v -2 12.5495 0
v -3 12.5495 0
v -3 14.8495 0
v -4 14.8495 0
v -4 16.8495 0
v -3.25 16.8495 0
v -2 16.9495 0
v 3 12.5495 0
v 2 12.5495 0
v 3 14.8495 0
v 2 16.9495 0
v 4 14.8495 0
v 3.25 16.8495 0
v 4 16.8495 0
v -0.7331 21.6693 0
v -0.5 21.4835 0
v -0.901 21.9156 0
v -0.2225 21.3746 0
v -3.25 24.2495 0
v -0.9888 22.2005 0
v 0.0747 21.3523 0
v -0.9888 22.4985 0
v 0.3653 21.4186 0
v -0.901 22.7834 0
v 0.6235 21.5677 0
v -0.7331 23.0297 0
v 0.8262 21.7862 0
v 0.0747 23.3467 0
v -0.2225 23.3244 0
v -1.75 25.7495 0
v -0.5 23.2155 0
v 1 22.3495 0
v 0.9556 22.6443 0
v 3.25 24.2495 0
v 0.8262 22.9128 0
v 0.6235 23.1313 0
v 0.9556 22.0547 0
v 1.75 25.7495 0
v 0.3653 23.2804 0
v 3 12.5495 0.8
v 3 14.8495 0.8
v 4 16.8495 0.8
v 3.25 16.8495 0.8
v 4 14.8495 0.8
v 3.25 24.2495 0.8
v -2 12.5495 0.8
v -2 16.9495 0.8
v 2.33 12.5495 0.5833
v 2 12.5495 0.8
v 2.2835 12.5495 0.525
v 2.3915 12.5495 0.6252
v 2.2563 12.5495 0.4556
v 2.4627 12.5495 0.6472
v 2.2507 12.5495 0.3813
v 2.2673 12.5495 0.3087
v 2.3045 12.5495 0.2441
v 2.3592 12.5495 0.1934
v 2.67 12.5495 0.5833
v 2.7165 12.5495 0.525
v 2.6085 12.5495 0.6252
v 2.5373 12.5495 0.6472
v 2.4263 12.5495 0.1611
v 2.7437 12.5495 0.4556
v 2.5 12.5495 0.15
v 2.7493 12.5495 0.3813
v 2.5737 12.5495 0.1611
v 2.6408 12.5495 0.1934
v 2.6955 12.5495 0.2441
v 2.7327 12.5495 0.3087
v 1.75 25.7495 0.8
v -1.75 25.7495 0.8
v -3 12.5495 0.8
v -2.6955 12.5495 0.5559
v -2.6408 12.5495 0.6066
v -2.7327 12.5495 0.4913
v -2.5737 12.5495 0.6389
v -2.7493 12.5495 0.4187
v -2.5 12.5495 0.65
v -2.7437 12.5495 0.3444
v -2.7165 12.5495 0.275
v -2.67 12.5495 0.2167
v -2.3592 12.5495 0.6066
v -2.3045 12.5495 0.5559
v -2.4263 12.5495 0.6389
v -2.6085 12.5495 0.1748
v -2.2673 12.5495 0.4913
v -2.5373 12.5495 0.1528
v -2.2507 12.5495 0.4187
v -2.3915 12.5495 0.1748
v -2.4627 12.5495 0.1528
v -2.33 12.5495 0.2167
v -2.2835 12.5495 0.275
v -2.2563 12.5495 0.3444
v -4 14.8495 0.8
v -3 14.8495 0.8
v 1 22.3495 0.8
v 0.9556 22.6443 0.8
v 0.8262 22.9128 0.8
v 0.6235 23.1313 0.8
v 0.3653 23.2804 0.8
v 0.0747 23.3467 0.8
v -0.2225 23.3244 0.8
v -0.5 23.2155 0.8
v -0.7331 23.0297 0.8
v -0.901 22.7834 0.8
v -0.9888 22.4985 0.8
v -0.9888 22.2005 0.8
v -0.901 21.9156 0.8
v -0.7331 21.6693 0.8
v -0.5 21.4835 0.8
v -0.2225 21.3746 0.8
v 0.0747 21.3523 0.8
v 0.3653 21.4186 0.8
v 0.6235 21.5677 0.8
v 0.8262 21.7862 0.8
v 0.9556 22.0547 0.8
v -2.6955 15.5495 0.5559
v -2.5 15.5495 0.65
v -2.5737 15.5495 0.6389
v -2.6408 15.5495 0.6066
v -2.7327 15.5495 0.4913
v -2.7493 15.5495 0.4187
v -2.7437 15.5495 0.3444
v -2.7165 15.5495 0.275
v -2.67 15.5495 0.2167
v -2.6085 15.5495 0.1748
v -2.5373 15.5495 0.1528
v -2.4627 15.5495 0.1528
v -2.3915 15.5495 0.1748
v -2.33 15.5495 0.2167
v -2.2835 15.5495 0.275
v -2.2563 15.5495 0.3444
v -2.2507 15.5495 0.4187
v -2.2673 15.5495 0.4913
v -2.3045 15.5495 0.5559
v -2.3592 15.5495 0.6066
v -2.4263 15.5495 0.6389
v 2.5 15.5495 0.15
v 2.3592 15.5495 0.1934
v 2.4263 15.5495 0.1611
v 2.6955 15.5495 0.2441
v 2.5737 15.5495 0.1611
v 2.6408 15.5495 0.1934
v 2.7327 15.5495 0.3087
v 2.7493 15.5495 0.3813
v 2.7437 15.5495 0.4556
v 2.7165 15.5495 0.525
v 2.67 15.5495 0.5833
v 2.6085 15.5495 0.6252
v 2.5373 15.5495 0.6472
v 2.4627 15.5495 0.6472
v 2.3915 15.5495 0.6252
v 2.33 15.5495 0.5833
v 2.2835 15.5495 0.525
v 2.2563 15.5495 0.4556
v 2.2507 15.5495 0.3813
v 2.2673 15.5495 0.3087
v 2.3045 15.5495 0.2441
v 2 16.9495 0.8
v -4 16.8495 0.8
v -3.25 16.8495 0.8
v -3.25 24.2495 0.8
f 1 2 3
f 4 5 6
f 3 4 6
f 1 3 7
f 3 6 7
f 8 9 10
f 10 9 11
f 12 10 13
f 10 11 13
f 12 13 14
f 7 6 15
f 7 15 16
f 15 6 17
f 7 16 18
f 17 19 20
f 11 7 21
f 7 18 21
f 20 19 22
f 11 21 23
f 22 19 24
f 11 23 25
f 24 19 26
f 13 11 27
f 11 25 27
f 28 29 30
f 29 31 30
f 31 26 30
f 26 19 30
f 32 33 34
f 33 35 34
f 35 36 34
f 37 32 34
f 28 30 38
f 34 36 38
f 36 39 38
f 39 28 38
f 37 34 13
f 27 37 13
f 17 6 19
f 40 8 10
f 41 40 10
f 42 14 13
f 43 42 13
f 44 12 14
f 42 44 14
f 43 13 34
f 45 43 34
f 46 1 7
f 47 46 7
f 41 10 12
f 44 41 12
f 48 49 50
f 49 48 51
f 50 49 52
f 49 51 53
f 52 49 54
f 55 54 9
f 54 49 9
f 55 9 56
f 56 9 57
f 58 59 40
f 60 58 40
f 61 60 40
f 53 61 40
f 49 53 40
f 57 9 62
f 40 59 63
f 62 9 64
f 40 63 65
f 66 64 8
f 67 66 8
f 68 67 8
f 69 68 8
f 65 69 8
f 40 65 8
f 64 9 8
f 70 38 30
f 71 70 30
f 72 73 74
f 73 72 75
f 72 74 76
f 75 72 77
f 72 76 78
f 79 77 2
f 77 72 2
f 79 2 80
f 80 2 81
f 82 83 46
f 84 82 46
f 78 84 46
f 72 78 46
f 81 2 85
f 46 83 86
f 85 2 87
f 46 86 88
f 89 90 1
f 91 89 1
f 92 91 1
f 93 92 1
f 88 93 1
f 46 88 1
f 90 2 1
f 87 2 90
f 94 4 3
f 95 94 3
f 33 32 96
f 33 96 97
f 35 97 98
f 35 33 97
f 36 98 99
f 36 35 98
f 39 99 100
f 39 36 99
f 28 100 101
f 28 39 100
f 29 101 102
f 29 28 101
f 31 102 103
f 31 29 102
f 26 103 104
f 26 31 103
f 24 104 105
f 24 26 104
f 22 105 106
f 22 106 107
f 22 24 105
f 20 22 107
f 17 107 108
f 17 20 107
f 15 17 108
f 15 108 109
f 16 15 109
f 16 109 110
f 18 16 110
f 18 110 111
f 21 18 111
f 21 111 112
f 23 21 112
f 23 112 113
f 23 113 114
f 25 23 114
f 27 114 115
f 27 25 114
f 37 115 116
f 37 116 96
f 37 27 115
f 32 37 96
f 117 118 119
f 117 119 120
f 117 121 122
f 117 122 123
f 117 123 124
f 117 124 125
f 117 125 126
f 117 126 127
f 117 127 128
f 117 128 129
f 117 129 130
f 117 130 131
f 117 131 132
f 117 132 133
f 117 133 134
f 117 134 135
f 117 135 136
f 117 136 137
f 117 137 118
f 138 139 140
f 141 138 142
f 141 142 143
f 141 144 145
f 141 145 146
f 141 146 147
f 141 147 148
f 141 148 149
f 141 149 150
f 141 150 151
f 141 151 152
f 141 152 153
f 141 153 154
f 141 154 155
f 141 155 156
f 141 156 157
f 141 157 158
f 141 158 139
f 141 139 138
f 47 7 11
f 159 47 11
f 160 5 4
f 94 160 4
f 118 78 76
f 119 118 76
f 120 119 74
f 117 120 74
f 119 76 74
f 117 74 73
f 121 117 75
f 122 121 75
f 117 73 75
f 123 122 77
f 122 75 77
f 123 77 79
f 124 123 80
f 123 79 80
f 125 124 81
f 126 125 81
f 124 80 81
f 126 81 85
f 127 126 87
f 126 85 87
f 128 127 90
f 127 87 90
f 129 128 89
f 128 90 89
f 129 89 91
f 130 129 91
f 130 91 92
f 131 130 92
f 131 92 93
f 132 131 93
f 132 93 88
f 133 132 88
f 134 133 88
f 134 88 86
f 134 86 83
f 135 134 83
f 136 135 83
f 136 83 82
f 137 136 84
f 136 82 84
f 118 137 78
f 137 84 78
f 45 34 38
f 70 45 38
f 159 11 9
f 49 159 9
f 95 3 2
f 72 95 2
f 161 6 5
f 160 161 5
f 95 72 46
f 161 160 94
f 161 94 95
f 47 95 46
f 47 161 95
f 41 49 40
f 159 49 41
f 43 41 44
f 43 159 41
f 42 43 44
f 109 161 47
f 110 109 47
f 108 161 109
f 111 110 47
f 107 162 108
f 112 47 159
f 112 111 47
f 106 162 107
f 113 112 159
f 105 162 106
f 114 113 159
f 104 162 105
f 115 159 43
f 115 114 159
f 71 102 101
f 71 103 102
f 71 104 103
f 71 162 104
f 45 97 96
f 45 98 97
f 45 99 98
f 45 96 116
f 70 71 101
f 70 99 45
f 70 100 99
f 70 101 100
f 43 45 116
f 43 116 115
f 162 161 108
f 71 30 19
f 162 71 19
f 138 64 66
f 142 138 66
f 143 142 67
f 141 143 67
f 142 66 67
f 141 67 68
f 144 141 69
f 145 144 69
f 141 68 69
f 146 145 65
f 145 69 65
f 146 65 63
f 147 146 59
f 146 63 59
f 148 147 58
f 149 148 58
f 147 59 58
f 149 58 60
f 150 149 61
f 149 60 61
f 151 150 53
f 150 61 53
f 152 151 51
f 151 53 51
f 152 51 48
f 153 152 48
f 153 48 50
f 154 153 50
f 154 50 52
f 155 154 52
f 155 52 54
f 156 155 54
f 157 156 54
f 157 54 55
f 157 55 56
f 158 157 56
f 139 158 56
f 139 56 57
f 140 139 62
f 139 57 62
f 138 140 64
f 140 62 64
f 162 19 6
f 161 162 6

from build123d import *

# Parameters (mm, degrees)
SKETCH_1_R          = 1
EXTRUDE_1_DEPTH     = 0.8
SKETCH_2_R          = 0.25
CUT_EXTRUDE_1_DEPTH = 3


with BuildPart() as part:
    # Эскиз1 → Вытянуть1 (new body)
    with BuildSketch(Plane.XY):
        Polygon((2, 12.549502762), (3, 12.549502762), (3, 14.849502762), (4, 14.849502762), (4, 16.849502762), (3.25, 16.849502762), (3.25, 24.249502762), (1.75, 25.749502762), (-1.75, 25.749502762), (-3.25, 24.249502762), (-3.25, 16.849502762), (-4, 16.849502762), (-4, 14.849502762), (-3, 14.849502762), (-3, 12.549502762), (-2, 12.549502762), (-2, 16.949502762), (2, 16.949502762), align=None)
        with Locations((0, 22.349502762)):
            Circle(SKETCH_1_R, mode=Mode.SUBTRACT)
    extrude(amount=EXTRUDE_1_DEPTH)

    # Эскиз2 → Вырез-Вытянуть1 (cut)
    with BuildSketch(Plane.XZ.offset(-12.549502762)):
        with Locations(Location((2.5, 0.4, 0), (0, 0, 270))):
            Circle(SKETCH_2_R)
        with Locations(Location((-2.5, 0.4, 0), (0, 0, 90))):
            Circle(SKETCH_2_R)
    extrude(amount=-CUT_EXTRUDE_1_DEPTH, mode=Mode.SUBTRACT)


solid = part.part
